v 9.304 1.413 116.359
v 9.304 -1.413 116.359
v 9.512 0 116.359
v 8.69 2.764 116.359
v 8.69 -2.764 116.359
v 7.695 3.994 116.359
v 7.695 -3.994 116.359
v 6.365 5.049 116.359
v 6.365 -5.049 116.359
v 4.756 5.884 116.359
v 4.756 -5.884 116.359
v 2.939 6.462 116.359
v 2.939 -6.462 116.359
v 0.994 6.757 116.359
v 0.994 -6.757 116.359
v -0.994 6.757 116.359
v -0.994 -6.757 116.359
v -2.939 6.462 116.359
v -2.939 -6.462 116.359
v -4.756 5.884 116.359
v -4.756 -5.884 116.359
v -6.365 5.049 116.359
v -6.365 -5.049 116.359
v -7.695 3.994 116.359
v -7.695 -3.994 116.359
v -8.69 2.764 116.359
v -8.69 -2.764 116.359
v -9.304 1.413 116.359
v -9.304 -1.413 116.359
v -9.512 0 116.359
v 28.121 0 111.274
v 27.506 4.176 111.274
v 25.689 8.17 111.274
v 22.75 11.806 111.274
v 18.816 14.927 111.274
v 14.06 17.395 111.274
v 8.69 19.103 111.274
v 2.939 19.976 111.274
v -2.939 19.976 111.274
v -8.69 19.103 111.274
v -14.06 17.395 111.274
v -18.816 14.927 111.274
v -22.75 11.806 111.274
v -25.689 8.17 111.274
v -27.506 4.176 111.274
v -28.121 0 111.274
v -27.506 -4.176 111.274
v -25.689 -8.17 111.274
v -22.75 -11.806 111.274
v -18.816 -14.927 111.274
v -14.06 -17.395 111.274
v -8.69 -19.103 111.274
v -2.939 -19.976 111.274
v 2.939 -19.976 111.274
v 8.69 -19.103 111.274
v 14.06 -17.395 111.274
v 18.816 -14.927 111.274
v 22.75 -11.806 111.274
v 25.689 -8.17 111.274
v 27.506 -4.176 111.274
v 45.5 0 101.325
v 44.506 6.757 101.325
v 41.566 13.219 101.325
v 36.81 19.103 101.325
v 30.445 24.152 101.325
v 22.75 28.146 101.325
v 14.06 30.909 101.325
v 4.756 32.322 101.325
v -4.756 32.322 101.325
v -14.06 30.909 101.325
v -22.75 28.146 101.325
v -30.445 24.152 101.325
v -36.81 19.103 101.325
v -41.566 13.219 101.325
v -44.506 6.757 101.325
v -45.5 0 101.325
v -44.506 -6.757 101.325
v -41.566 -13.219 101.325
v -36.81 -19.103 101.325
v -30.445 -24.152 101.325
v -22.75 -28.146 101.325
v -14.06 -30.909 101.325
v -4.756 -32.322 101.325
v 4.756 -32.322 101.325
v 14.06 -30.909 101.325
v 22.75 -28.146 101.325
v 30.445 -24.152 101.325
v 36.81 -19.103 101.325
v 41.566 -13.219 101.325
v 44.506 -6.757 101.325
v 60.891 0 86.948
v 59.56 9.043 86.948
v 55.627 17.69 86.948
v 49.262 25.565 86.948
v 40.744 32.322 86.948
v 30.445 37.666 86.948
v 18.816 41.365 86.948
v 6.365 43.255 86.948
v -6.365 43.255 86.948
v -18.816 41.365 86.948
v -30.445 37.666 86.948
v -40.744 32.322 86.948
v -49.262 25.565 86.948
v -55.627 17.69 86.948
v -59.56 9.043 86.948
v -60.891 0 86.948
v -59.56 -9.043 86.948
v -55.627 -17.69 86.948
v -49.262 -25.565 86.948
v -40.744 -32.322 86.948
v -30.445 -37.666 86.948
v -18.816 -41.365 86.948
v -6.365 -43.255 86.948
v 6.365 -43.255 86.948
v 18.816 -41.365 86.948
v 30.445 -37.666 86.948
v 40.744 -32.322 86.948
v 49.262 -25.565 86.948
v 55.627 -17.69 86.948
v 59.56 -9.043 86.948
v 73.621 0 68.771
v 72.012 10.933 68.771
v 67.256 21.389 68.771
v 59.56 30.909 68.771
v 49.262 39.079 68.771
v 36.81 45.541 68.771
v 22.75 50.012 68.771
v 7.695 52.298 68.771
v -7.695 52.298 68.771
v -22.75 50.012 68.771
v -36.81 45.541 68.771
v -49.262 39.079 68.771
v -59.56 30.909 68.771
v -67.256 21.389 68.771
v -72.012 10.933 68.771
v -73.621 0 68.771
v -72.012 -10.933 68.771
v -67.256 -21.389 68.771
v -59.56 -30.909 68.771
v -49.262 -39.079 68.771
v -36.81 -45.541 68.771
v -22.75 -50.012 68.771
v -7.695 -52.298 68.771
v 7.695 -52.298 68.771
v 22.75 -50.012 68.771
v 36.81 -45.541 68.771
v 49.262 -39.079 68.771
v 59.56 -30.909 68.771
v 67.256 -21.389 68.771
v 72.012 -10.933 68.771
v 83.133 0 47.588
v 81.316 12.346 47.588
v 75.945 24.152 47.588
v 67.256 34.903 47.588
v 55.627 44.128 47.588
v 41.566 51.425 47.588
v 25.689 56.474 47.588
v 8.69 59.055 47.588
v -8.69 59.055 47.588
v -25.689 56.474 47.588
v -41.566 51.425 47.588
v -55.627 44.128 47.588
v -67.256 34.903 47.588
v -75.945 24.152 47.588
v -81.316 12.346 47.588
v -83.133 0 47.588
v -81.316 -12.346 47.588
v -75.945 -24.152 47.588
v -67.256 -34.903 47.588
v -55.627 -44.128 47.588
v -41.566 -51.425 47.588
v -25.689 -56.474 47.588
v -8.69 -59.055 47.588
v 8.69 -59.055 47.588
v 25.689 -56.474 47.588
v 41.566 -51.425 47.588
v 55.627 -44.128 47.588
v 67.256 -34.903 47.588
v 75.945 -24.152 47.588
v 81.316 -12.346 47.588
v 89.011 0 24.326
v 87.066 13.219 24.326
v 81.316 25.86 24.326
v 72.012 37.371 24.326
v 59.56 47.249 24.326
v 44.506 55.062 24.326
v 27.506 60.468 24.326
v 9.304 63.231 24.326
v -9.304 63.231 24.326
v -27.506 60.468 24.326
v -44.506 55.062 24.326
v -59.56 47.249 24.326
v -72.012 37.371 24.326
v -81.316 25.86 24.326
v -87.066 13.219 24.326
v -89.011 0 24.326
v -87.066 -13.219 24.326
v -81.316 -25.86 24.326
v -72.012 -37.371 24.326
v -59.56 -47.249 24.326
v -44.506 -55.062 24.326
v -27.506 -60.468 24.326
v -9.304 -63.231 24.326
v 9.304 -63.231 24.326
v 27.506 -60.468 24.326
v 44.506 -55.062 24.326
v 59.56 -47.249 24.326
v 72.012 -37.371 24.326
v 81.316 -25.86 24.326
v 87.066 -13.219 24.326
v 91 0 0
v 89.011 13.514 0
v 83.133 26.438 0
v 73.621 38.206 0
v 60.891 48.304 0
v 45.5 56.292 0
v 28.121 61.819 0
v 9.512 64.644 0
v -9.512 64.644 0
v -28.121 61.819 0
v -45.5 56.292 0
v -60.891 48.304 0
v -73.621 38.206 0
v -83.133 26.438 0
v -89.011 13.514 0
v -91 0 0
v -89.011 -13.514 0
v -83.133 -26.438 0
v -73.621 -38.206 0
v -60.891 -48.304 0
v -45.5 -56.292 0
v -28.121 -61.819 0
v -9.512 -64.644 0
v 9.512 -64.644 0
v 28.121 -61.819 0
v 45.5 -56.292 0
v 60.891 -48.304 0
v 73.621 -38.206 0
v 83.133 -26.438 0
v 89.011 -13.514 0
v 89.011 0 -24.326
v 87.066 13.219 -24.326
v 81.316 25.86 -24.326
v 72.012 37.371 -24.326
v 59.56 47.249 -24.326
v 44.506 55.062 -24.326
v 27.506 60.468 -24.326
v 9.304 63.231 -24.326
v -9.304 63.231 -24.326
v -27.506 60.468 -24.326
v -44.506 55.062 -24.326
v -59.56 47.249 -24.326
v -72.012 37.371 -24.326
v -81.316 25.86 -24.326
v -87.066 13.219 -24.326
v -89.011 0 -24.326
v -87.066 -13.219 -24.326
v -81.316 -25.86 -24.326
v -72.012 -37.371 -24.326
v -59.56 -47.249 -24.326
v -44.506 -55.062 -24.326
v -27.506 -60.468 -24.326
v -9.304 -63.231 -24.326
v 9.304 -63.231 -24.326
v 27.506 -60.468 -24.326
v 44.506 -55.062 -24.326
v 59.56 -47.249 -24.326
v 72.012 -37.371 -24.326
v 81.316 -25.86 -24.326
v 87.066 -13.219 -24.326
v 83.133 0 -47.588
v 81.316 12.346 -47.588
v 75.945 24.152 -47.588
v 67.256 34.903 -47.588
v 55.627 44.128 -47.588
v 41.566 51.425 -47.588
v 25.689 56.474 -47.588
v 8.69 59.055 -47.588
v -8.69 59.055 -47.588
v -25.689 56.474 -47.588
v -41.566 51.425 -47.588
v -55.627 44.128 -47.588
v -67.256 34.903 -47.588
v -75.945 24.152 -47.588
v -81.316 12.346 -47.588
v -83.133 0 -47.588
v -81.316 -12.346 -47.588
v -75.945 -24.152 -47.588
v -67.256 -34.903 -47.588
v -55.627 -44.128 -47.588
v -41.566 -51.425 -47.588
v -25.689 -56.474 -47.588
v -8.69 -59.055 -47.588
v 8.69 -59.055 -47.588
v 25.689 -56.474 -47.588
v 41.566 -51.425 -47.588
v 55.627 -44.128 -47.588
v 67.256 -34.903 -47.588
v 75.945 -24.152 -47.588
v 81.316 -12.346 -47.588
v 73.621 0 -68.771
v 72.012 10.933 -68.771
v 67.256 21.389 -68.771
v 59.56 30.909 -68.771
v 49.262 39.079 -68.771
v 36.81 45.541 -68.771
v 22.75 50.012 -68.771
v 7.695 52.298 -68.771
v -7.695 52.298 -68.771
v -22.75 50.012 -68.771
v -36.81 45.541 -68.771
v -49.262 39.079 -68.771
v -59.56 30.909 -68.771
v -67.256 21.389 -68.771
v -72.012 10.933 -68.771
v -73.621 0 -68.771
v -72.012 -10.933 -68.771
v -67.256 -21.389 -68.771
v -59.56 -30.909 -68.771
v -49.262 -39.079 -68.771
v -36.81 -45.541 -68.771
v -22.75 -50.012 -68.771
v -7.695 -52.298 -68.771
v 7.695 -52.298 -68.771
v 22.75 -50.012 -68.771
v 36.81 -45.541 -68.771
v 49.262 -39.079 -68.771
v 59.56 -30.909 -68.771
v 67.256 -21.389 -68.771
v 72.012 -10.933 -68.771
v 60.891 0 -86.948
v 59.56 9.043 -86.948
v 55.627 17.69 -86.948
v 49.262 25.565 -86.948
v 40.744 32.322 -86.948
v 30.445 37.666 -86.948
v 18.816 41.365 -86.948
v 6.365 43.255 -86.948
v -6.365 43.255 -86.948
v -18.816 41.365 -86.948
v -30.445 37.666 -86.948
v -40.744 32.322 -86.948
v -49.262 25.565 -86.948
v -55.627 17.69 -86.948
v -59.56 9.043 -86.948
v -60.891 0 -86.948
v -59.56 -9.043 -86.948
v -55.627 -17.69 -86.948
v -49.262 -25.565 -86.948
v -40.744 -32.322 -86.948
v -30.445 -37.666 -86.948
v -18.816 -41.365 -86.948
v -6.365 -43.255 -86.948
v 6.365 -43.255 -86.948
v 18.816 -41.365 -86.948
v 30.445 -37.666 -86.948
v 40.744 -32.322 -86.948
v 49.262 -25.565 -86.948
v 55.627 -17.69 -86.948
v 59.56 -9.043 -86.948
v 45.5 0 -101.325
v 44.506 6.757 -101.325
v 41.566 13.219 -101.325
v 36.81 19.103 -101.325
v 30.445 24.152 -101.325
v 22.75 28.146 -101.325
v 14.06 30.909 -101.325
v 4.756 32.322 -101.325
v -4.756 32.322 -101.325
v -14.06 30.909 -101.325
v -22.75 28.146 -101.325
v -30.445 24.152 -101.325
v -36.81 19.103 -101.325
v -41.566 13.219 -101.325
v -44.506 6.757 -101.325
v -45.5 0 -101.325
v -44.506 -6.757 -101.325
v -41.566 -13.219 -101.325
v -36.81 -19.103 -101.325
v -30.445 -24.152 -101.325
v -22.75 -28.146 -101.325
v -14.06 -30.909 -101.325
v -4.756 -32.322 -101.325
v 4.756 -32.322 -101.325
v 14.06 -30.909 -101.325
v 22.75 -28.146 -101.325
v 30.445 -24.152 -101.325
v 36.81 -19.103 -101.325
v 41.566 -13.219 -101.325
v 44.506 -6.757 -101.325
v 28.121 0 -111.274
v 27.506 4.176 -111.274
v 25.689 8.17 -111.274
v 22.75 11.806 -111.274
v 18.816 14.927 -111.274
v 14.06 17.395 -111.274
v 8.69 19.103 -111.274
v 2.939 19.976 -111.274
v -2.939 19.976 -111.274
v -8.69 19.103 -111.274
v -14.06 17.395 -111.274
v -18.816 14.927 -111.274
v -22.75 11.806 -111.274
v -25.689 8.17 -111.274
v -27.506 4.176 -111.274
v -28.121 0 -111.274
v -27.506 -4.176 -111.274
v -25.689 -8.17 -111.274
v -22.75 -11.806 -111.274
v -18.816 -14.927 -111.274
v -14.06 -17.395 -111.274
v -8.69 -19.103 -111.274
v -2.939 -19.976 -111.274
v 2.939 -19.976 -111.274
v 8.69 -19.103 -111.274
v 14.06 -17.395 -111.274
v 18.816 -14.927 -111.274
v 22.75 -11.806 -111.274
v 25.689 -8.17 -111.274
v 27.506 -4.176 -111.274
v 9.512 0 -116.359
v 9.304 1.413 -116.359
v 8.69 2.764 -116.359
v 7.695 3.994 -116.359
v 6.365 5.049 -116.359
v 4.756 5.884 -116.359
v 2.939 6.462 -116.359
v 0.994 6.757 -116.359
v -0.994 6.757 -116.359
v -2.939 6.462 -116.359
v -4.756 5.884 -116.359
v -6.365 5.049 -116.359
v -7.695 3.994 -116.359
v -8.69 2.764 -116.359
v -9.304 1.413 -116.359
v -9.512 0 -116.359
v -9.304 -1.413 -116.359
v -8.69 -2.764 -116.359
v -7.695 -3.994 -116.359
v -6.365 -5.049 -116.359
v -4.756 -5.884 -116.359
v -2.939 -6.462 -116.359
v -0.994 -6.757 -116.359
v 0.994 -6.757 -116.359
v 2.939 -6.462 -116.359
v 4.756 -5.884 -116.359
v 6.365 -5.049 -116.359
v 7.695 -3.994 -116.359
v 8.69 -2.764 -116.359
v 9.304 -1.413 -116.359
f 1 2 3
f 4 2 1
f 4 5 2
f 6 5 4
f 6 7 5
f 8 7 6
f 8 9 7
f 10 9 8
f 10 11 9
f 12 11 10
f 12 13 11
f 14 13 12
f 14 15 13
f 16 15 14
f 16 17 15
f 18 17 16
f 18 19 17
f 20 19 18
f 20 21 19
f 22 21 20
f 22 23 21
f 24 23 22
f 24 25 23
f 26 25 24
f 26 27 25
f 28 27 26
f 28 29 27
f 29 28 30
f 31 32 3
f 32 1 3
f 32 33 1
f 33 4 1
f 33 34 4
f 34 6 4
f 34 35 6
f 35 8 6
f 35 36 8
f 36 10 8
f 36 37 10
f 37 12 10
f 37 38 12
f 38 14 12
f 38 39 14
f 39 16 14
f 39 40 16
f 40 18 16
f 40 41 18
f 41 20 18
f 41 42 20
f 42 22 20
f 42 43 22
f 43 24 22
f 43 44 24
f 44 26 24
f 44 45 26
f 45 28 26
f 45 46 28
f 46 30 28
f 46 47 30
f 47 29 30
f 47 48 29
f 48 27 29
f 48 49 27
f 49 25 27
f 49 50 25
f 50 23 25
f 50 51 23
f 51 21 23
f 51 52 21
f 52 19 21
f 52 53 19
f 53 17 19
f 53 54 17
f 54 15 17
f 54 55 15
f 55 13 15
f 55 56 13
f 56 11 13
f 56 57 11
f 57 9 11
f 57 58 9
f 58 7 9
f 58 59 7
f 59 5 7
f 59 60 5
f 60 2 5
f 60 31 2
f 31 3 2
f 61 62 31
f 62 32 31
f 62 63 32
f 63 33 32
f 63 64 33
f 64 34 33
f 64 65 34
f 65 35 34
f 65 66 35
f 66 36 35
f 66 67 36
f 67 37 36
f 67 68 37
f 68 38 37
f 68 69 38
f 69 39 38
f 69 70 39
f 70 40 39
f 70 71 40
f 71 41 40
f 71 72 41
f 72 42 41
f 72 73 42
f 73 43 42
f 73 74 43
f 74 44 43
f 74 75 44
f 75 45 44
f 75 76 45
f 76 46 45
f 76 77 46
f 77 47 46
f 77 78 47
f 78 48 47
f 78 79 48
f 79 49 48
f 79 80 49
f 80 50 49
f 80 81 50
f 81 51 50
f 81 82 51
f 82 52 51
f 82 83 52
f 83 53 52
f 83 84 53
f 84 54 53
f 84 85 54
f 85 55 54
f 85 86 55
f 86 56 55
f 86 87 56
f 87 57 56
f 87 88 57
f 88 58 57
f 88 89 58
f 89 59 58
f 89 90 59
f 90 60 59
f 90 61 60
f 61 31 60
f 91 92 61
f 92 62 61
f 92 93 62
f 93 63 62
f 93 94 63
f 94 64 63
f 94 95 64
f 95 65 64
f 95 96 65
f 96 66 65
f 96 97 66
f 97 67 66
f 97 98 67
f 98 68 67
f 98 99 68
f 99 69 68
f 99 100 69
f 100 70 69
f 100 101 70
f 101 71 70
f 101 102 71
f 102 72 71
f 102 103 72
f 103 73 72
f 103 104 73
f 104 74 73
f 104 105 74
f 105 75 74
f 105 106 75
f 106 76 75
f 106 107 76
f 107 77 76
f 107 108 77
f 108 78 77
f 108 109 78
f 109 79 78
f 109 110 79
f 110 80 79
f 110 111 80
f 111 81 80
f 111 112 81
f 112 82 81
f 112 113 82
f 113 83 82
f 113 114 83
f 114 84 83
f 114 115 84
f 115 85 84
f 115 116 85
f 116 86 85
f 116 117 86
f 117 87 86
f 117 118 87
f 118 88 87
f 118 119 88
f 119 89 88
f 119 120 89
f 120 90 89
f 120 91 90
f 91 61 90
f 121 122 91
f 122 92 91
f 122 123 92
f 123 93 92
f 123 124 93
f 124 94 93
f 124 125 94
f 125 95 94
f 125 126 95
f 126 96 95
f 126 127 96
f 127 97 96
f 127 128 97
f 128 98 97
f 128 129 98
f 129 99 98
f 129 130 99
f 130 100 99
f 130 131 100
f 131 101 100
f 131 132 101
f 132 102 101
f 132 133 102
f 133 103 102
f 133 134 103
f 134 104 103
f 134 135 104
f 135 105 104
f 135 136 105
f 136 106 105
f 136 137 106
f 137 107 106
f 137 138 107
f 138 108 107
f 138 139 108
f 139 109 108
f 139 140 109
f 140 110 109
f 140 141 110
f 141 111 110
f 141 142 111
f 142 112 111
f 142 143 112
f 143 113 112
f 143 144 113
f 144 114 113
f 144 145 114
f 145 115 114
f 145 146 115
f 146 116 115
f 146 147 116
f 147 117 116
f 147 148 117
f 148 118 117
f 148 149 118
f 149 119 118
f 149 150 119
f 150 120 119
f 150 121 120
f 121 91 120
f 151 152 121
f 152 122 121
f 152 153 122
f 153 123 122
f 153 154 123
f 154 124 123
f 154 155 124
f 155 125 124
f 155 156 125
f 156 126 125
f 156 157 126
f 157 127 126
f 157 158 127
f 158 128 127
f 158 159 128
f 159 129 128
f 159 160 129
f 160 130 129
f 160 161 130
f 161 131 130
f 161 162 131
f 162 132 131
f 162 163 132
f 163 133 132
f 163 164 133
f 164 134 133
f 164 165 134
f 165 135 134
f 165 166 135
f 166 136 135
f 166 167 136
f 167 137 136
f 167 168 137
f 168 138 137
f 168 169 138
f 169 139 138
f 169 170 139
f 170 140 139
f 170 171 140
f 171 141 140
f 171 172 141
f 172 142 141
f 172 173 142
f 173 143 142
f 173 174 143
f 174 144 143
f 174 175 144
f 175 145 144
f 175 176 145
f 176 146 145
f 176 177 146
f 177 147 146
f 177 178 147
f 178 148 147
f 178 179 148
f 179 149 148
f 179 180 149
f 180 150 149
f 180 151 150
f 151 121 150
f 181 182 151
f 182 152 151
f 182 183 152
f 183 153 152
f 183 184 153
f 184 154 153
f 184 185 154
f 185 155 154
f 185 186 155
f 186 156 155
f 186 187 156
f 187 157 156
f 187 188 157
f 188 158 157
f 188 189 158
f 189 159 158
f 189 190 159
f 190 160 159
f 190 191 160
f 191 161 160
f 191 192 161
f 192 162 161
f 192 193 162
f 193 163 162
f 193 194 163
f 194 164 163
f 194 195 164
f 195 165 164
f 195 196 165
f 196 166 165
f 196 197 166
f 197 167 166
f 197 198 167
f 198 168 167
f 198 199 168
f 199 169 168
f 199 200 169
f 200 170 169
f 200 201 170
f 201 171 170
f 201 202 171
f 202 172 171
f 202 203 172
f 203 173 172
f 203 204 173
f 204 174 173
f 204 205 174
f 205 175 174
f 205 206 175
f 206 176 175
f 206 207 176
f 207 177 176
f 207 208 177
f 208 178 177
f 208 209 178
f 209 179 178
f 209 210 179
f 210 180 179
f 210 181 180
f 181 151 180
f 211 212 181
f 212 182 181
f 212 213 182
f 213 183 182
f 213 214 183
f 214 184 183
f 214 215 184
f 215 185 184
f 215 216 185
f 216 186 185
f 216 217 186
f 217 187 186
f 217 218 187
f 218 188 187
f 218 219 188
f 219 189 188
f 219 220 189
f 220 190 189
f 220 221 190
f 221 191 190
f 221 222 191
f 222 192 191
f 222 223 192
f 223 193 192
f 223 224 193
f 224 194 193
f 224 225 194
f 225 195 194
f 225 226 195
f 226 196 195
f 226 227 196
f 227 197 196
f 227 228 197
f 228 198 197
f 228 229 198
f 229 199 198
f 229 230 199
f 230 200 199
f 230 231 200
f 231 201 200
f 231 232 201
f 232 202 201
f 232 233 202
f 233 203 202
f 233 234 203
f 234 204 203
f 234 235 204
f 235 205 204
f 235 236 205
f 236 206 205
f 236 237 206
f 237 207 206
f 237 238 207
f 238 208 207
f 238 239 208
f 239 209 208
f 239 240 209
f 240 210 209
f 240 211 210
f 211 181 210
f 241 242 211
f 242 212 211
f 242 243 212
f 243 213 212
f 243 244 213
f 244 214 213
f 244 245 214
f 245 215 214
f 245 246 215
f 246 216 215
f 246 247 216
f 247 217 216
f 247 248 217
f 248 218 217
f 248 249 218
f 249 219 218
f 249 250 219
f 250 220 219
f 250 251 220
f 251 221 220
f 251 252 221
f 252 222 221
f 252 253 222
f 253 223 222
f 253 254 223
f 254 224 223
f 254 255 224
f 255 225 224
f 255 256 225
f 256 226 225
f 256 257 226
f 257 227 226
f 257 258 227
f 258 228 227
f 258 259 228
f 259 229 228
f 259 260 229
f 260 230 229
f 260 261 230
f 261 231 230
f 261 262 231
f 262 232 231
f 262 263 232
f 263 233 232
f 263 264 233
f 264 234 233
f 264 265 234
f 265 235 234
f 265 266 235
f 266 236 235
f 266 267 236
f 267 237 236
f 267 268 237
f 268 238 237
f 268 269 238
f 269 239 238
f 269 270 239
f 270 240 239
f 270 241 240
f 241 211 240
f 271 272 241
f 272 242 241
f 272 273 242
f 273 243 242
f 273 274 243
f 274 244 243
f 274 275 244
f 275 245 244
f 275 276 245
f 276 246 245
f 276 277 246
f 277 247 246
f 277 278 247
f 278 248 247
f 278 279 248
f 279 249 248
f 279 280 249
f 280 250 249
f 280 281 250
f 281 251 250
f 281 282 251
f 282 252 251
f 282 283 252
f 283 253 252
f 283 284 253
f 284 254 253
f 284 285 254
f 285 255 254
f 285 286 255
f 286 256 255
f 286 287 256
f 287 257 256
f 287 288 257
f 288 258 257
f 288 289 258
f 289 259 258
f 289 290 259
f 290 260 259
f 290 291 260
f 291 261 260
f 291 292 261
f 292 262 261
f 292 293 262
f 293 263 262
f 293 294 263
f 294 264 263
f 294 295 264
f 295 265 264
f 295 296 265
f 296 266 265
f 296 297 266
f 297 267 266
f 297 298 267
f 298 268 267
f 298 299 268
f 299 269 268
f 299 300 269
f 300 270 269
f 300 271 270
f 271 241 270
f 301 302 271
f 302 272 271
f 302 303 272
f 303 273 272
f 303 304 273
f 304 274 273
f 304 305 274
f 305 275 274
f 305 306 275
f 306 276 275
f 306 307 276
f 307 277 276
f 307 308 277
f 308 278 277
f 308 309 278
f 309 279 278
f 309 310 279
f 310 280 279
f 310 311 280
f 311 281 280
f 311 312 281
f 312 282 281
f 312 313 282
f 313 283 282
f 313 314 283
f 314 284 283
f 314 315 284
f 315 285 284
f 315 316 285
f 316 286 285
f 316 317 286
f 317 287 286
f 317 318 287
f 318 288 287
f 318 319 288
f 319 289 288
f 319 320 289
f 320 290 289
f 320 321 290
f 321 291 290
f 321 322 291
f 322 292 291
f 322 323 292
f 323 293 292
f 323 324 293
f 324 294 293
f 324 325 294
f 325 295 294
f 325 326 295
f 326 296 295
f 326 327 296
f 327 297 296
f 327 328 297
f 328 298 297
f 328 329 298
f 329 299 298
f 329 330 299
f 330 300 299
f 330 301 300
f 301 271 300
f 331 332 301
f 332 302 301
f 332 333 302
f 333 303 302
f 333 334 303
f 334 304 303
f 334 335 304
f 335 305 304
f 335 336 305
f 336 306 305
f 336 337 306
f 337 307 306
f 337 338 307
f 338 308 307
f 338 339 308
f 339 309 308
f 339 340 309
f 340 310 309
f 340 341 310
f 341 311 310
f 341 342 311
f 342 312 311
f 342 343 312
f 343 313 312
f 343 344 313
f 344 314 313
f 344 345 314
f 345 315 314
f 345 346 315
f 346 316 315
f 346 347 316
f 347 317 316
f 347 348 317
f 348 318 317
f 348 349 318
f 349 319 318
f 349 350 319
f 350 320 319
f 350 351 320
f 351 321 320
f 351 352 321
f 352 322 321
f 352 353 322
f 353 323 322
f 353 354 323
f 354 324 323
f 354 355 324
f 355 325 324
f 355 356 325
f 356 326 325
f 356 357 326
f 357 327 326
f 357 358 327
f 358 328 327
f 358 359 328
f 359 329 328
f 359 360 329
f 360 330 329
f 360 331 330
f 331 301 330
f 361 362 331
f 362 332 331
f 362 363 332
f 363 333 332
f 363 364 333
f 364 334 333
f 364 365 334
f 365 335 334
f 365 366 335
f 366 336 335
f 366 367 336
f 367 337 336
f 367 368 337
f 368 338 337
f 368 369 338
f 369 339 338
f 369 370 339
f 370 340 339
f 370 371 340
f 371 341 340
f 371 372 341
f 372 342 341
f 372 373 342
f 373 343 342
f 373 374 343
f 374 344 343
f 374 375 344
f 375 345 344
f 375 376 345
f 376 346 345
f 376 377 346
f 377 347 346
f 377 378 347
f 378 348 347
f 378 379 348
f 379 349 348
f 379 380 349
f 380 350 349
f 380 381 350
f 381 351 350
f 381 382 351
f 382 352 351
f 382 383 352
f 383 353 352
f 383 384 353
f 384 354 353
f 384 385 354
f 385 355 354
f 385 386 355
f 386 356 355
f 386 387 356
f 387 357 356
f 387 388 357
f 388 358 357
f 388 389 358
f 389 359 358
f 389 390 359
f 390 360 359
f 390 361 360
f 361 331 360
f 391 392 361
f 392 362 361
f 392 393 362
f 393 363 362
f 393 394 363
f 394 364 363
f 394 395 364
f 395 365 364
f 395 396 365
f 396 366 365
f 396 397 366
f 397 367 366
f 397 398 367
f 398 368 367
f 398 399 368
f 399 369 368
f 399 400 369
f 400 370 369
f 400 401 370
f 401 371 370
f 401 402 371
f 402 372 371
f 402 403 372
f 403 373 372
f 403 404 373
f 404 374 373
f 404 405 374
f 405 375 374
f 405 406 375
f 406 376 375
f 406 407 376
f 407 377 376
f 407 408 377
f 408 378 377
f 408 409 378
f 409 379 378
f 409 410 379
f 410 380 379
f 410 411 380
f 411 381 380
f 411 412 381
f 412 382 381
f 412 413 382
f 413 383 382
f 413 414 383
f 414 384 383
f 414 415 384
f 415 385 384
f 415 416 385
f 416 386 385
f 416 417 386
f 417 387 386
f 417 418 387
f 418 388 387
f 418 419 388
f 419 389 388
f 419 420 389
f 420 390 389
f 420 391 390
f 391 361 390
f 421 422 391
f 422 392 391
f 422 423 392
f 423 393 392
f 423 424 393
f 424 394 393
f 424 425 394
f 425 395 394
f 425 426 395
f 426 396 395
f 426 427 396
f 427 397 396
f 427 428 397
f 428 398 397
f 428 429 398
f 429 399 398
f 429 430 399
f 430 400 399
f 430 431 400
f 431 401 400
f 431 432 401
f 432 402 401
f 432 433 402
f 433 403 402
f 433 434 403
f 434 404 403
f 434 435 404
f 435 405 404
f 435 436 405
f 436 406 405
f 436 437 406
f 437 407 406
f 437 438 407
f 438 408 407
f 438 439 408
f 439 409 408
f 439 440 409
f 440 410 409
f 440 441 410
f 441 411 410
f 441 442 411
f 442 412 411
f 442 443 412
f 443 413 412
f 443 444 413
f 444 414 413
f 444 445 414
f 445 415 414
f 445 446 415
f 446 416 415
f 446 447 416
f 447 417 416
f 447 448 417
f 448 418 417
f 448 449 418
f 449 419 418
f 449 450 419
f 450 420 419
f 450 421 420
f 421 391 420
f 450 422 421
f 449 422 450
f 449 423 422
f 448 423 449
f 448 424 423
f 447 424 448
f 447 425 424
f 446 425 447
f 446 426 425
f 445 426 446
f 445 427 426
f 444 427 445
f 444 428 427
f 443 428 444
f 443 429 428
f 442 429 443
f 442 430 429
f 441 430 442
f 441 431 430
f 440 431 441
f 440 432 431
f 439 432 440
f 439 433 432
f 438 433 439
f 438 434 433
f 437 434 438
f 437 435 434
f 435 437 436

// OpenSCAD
// Generated by SolidPython 1.0.1 on 2020-07-29 00:46:47


scale(v = [7, 5, 9]) {
	sphere(r = 13);
}
/***********************************************
*********      SolidPython code:      **********
************************************************
 
# import packages: SolidPython
from solid import *
from solid.utils import *
from itertools import chain, combinations, permutations


class Resize:

    def __init__(self, scad_file):
        self.scad_file = scad_file
        #self.scad_file = import_scad(scad_file)
        # cone/cylinder param:
        self.r1 = 0
        self.r2 = 0
        self.h = 0
        # rectangular prism param:
        self.w = 0
        self.l = 0
        # ellipse param:
        self.r = 0

    # import OpenScad code (file name corresponds to shape)


    # classify shape + parameters
    def assign(self, param1, param2, param3):
        if self.scad_file == 'cone.scad':
            self.r1 = param1
            self.r2 = param2
            self.h = param3
        elif self.scad_file == 'cylinder.scad':
            self.r1 = param1
            self.r2 = param2
            self.h = param3
        elif self.scad_file == 'rectangularPrism.scad':
            self.h = param1
            self.l = param2
            self.w = param3
        else:
            self.r = param1
            self.h = param2

    # resize parameters
    def iterate(self):
        x = range(3, 20, 2)
        i = 1
        if self.scad_file == 'cone.scad':
            tempList = list(permutations(x, 2))
            for temp in tempList:
                param1 = temp[0]
                param2 = temp[1]
                filepath = 'produced_scad_files/' + 'cone' + str(param1) + '_' + str(param2) + '_' + '.scad'
                scad_render_to_file(cylinder(h=param1, r1=param2, r2=0), filepath)

        elif self.scad_file == 'cylinder.scad':
            tempList = list(permutations(x, 3))
            for temp in tempList:
                param1 = temp[0]
                param2 = temp[1]
                filepath = 'produced_scad_files/' + 'cylinder' + str(param1) + '_' + str(param2) + '_' + '.scad'
                scad_render_to_file(cylinder(h=param1, r1=param2, r2=param2), filepath)

        elif self.scad_file == 'rectangularPrism.scad':
            tempList = list(permutations(x, 3))
            for temp in tempList:
                param1 = temp[0]
                param2 = temp[1]
                param3 = temp[2]
                filepath = 'produced_scad_files/' + 'rectangularPrism' + str(param1) + '_' + str(param2) + '_' + str(
                    param3) + '.scad'
                scad_render_to_file(cube(size=(param1, param2, param3)), filepath)

        elif self.scad_file == 'ellipse.scad':
            tempList = list(permutations(x, 4))
            for temp in tempList:
                param1 = temp[0]
                param2 = temp[1]
                param3 = temp[2]
                param4 = temp[3]
                filepath = 'produced_scad_files/' + 'ellipse' + str(param1) + '_' + str(param2) + '_' + str(param3) + '_' + str(param4) + '.scad'
                scad_render_to_file(scale([param1, param2, param3])(sphere(r=param4)), filepath)

    def render_to_scadfile(self):
        scad_render_to_file(scad, 'example.scad') 
 
************************************************/
